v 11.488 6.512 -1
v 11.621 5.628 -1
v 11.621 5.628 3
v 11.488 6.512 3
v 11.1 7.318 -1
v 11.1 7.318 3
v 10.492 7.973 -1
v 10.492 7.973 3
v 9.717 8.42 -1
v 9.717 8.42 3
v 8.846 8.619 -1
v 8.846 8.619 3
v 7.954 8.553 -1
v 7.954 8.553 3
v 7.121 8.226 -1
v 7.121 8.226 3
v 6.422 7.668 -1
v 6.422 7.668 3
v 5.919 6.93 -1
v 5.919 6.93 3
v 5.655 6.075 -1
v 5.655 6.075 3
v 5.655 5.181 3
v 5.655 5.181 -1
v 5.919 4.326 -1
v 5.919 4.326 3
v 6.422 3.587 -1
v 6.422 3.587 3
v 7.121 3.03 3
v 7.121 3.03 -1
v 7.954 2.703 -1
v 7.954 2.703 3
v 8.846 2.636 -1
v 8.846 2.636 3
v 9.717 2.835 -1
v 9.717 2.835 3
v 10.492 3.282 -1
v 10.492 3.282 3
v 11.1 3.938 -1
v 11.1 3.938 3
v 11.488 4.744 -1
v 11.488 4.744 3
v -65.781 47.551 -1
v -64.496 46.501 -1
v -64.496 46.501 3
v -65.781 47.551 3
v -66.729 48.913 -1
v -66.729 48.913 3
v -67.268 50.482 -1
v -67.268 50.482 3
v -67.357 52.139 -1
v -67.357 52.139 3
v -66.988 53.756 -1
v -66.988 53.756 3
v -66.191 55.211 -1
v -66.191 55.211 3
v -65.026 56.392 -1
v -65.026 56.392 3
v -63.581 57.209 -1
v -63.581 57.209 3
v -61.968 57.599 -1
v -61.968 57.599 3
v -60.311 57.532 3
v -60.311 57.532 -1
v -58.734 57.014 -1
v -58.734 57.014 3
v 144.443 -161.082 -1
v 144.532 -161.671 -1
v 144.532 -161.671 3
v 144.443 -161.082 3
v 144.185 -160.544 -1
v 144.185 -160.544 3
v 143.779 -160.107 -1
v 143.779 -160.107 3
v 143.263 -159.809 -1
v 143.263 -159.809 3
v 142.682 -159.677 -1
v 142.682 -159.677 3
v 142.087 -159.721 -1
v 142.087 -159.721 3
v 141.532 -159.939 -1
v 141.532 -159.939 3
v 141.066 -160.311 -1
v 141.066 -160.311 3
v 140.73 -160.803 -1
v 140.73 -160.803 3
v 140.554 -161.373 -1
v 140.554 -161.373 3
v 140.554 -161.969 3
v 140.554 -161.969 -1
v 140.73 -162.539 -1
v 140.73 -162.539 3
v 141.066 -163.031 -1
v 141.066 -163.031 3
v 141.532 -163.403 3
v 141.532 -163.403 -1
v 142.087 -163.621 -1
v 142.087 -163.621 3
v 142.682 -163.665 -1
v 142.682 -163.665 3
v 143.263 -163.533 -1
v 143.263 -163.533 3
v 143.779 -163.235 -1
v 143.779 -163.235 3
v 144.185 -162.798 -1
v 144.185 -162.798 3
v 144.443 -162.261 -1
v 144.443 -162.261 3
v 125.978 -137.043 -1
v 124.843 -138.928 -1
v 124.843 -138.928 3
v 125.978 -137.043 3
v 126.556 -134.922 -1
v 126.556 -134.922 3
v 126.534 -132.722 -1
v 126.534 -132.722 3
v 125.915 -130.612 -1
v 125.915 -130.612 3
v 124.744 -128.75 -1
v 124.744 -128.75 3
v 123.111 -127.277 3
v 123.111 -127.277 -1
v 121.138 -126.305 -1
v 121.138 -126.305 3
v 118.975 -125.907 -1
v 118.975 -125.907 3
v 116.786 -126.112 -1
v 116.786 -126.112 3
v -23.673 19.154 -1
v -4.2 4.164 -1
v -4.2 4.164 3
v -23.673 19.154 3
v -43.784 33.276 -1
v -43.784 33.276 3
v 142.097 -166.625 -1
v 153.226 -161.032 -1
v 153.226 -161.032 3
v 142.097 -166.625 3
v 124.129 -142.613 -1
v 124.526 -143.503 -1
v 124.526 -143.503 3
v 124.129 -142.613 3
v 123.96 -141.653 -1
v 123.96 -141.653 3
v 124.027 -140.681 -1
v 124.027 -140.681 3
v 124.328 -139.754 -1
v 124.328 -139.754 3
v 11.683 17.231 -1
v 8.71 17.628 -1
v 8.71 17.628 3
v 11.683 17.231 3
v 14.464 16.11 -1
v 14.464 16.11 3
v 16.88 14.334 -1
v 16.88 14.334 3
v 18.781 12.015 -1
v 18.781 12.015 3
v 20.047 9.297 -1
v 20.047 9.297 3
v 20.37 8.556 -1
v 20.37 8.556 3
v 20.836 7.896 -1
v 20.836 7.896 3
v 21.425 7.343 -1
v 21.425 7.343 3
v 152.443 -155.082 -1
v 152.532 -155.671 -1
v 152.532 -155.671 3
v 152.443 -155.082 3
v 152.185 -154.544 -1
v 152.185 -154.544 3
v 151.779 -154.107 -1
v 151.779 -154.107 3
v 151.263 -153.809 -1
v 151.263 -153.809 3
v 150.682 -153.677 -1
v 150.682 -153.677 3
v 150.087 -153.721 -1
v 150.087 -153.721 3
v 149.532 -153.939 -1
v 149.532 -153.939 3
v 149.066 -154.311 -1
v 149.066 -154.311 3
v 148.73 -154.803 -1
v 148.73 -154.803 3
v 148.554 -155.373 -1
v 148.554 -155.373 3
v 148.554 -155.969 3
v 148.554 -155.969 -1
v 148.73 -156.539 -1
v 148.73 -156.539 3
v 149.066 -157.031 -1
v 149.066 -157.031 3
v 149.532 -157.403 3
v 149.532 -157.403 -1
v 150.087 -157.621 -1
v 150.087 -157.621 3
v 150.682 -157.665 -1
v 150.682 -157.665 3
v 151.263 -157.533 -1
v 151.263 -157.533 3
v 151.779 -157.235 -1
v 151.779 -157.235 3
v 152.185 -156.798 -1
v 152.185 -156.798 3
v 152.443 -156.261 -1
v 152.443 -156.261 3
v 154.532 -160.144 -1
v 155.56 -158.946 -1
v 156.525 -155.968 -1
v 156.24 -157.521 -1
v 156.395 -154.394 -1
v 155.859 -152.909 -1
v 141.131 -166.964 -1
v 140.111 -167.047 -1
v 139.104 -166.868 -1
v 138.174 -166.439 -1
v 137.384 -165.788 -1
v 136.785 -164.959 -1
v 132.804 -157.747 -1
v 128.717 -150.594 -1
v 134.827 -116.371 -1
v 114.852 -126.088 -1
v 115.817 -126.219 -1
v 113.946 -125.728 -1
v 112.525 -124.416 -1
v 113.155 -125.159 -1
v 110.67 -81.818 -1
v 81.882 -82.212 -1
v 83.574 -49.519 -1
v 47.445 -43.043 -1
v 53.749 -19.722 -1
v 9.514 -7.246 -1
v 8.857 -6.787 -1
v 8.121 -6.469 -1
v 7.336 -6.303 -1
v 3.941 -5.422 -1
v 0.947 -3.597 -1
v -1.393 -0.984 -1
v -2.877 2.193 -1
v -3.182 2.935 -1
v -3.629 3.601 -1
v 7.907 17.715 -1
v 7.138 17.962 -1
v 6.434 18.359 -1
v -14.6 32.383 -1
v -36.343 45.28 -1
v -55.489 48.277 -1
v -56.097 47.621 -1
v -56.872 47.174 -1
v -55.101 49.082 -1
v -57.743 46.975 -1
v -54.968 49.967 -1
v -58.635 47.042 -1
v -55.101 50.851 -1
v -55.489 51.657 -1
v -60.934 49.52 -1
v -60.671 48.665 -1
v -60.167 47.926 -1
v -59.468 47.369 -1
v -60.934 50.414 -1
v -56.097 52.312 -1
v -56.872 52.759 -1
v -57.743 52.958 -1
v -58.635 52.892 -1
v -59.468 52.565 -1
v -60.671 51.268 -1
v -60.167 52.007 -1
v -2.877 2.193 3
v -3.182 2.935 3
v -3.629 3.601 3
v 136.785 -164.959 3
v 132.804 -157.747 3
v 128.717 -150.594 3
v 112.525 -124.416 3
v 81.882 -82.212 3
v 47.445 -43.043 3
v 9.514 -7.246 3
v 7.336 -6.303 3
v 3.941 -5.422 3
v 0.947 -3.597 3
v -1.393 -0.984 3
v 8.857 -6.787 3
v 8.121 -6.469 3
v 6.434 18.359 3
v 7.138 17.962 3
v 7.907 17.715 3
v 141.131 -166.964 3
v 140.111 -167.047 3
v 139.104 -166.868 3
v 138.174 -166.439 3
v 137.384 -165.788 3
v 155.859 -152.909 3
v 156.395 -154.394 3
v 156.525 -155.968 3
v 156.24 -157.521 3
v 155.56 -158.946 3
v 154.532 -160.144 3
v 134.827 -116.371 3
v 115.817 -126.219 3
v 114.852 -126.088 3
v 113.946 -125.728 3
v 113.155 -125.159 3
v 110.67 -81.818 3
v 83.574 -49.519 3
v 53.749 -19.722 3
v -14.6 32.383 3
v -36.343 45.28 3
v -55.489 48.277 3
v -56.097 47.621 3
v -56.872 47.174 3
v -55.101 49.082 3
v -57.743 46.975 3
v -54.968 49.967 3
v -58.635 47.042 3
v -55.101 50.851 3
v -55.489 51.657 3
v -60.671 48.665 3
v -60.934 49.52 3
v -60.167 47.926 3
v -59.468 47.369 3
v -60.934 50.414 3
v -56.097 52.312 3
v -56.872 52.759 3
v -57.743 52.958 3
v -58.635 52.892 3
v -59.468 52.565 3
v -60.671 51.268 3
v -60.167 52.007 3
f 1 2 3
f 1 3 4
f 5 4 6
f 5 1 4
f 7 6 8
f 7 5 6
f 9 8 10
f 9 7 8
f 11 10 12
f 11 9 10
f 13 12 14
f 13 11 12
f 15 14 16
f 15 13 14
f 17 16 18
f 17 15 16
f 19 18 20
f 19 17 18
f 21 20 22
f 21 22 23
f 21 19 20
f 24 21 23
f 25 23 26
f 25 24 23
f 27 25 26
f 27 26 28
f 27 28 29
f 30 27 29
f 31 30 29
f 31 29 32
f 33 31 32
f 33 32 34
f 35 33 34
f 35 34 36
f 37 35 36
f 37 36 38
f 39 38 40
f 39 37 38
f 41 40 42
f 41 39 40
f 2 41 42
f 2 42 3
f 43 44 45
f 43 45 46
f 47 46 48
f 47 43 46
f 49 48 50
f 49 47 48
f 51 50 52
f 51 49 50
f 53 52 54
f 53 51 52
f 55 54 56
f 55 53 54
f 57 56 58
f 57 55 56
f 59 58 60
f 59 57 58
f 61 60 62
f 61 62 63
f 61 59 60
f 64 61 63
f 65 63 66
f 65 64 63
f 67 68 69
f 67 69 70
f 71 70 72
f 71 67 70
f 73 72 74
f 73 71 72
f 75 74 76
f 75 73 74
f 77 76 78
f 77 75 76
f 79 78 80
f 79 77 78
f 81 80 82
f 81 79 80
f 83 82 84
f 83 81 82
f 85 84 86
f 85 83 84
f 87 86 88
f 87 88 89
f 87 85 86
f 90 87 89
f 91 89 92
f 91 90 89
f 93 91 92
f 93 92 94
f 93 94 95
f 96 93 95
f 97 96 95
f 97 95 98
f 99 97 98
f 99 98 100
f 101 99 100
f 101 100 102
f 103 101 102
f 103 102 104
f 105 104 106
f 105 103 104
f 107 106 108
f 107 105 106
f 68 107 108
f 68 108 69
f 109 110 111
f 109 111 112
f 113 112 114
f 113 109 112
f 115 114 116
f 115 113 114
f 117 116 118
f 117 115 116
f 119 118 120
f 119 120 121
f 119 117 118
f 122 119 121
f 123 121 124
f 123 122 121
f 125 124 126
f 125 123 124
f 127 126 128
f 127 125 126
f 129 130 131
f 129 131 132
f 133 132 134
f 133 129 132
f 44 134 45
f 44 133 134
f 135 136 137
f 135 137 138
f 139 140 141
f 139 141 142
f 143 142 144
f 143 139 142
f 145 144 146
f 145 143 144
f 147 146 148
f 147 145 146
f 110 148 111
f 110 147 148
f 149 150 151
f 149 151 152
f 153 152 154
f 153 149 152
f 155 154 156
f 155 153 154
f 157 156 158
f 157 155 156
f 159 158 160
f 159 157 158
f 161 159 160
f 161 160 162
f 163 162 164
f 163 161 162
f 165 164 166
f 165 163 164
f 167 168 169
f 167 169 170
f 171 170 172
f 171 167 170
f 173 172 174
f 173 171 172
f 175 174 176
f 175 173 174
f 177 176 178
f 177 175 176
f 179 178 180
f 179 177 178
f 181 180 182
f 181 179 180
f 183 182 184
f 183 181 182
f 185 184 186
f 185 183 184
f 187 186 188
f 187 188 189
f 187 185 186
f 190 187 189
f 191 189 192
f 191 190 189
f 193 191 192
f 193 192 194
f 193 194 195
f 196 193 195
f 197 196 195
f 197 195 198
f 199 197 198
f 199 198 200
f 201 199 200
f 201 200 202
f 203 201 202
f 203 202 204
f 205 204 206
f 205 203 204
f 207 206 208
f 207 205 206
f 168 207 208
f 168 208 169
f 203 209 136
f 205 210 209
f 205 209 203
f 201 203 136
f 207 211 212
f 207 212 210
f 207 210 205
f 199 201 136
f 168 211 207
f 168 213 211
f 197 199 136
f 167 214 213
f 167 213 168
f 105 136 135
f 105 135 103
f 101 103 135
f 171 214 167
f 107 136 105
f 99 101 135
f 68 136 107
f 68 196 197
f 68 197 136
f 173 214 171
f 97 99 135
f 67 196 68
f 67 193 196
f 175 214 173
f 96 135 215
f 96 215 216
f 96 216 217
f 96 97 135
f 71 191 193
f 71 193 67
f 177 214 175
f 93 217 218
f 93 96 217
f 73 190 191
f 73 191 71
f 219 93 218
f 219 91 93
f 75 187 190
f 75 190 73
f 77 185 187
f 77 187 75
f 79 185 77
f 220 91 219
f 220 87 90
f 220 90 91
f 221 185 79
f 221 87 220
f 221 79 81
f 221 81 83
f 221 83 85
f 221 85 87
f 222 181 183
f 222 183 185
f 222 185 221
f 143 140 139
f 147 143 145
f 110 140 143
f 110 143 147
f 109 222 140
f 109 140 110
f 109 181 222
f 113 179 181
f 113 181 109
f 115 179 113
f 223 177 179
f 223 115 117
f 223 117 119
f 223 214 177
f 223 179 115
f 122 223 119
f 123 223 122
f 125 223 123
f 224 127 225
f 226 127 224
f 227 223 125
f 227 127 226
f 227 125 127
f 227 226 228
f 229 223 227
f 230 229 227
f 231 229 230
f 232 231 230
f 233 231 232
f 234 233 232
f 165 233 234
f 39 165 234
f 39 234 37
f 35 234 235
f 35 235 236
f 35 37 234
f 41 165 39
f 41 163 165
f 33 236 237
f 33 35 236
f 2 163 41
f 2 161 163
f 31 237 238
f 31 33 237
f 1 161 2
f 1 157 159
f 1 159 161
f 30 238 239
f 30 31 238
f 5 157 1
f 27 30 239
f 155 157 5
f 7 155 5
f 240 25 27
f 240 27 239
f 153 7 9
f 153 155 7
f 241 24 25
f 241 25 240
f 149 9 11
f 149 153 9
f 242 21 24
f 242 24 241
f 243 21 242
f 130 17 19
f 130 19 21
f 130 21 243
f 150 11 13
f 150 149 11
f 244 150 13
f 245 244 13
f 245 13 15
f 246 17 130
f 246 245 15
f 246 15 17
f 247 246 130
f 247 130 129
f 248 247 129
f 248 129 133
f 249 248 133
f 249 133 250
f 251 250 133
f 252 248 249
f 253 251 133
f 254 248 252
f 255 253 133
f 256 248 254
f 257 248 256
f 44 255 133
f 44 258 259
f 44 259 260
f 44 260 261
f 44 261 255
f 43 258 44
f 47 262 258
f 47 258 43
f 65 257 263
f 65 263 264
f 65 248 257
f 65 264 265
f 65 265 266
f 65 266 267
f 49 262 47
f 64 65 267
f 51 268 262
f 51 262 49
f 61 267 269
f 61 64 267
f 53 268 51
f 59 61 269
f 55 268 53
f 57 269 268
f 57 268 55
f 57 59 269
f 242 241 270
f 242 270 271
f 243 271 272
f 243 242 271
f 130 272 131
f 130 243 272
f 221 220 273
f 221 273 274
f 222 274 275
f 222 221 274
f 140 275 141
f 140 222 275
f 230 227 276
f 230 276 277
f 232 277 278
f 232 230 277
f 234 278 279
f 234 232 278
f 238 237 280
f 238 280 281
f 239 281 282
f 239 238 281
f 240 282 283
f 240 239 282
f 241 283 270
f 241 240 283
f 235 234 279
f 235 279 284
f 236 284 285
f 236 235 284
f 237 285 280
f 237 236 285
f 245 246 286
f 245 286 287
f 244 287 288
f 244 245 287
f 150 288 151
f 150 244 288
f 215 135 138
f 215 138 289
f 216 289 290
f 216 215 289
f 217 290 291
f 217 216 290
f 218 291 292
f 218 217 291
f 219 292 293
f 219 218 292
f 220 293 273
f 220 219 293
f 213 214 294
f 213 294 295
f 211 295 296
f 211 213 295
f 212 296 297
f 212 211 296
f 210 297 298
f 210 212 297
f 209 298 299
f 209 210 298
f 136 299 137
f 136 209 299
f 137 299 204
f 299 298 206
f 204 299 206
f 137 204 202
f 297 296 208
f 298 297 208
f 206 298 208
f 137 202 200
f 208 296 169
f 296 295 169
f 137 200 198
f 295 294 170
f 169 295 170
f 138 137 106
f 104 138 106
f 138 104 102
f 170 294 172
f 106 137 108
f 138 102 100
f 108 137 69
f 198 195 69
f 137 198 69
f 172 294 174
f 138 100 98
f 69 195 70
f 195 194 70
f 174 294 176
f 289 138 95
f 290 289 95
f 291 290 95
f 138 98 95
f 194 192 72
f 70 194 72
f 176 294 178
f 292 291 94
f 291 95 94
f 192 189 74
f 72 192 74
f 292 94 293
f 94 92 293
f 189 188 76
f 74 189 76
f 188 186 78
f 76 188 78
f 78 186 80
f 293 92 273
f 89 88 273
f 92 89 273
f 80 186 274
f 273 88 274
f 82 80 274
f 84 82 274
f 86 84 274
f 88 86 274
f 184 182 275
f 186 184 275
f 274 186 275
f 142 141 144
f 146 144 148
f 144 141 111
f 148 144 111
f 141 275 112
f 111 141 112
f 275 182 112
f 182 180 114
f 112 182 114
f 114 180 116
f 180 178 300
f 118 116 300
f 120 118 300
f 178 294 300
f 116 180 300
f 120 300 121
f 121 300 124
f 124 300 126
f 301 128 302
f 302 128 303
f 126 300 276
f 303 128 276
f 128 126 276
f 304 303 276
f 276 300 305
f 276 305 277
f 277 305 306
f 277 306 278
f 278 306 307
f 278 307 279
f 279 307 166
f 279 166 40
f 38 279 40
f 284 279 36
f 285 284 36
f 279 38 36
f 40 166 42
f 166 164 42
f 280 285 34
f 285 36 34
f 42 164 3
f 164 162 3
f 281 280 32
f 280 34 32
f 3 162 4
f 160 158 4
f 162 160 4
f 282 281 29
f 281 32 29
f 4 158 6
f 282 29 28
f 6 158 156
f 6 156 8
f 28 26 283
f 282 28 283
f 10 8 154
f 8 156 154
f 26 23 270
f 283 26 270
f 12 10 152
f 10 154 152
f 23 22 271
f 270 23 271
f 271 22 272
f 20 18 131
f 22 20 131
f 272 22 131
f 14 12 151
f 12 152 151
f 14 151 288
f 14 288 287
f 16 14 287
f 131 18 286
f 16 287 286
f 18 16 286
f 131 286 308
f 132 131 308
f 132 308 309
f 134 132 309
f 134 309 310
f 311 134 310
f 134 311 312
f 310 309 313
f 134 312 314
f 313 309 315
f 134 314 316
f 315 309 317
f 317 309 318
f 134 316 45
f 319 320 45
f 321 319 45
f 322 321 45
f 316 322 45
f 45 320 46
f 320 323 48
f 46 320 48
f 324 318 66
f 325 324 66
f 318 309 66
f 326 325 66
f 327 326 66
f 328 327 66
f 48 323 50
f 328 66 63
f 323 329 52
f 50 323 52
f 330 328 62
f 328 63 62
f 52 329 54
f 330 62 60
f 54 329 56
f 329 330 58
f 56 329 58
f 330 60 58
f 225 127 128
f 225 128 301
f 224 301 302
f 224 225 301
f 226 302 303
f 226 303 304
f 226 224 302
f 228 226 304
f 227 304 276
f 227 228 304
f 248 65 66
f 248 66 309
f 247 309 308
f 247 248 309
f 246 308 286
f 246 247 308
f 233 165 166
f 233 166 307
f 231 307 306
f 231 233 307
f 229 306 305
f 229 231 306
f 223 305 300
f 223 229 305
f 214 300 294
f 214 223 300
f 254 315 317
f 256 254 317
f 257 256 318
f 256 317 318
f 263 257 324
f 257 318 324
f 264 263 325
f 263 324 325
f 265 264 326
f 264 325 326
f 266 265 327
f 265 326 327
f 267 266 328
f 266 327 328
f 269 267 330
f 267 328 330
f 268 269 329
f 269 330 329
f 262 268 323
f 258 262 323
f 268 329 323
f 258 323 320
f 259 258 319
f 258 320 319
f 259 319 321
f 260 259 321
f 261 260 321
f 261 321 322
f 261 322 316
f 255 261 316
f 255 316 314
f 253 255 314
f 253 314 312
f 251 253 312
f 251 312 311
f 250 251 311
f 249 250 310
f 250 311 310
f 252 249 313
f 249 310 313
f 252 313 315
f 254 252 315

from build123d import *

# Parameters (mm, degrees)
SKETCH_1_R          = 1.5
SKETCH_1_R_2        = 1
EXTRUDE_1_DEPTH     = 2
SCALE_1_SCALE       = 2
SKETCH_3_R          = 1.627142949
SKETCH_3_R_2        = 4.234260579
SKETCH_3_R_3        = 3
EXTRUDE_3_DEPTH     = 4
SKETCH_2_R          = 3
CUT_EXTRUDE_1_DEPTH = 4


with BuildPart() as part:
    # 草图1 → 凸台-拉伸1 (new body)
    with BuildSketch(Plane.XY):
        with BuildLine():
            Line((107.302513423, -106.329977447), (101.737876551, -109.126595767))
            ThreePointArc((101.737876551, -109.126595767), (100.241041238, -109.247857431), (99.081776454, -108.293223729))
            ThreePointArc((99.081776454, -108.293223729), (96.076157143, -102.895430459), (92.952174798, -97.565265927))
            ThreePointArc((92.952174798, -97.565265927), (92.67119221, -96.396525563), (93.110928625, -95.277804356))
            ThreePointArc((93.110928625, -95.277804356), (93.386262354, -90.634283432), (89.082079375, -88.870167754))
            ThreePointArc((89.082079375, -88.870167754), (87.883298953, -88.781676215), (86.951761021, -88.02197737))
            ThreePointArc((86.951761021, -88.02197737), (63.249240179, -56.927091802), (35.446375502, -29.437055089))
            ThreePointArc((35.446375502, -29.437055089), (34.93756912, -29.118601809), (34.357184804, -28.965466337))
            ThreePointArc((34.357184804, -28.965466337), (31.162596189, -27.612410648), (29.250996223, -24.717252331))
            ThreePointArc((29.250996223, -24.717252331), (28.99483955, -24.174407799), (28.589143834, -23.732019493))
            ThreePointArc((28.589143834, -23.732019493), (13.863721442, -12.651321704), (-1.558710581, -2.56328331))
            ThreePointArc((-1.558710581, -2.56328331), (-2.630799159, 1.441837641), (1.322046154, 2.692989782))
            ThreePointArc((1.322046154, 2.692989782), (17.996215952, -6.326789823), (33.906457747, -16.634484455))
            ThreePointArc((33.906457747, -16.634484455), (34.447529327, -16.904338105), (35.04451896, -17.000165164))
            ThreePointArc((35.04451896, -17.000165164), (38.553058948, -18.165150249), (40.712715331, -21.16563811))
            ThreePointArc((40.712715331, -21.16563811), (40.982462328, -21.706762868), (41.401593445, -22.142547854))
            ThreePointArc((41.401593445, -22.142547854), (79.427798672, -58.499548545), (108.618618094, -102.268485529))
            ThreePointArc((108.618618094, -102.268485529), (108.809267395, -104.574248701), (107.302513423, -106.329977447))
        make_face()
        Circle(SKETCH_1_R, mode=Mode.SUBTRACT)
        with Locations((105.955364791, -103.64945687)):
            Circle(SKETCH_1_R_2, mode=Mode.SUBTRACT)
        with Locations((101.955364791, -106.64945687)):
            Circle(SKETCH_1_R_2, mode=Mode.SUBTRACT)
        with Locations((35, -23)):
            Circle(SKETCH_1_R, mode=Mode.SUBTRACT)
    extrude(amount=EXTRUDE_1_DEPTH)


with BuildPart() as part_1:
    # 缩放比例1: scaled about (61.378569751, -51.627856738, 1)
    add(part.part.scale(SCALE_1_SCALE).moved(Location((-61.378569751, 51.627856738, -1))))

    # 草图3 → 凸台-拉伸3 (add)
    # profile 1 of 8: a face of its own
    with BuildSketch(Plane(origin=(0, 0, -1), x_dir=(-1, 0, 0), z_dir=(0, 0, -1))):
        with Locations((58.543077077, 54.655425944)):
            Circle(SKETCH_3_R)
    # profile 2 of 8: a face of its own
    with BuildSketch(Plane(origin=(0, 0, -1), x_dir=(-1, 0, 0), z_dir=(0, 0, -1))):
        with Locations((61.20941419, 50.866420573)):
            Circle(SKETCH_3_R_2)
        with Locations((61.378569751, 51.627856738)):
            Circle(SKETCH_3_R_3, mode=Mode.SUBTRACT)
    # profile 3 of 8: a face of its own
    with BuildSketch(Plane(origin=(0, 0, -1), x_dir=(-1, 0, 0), z_dir=(0, 0, -1))):
        with Locations((58.543077077, 54.655425944)):
            Circle(SKETCH_3_R)
    # profile 4 of 8: a face of its own
    with BuildSketch(Plane(origin=(0, 0, -1), x_dir=(-1, 0, 0), z_dir=(0, 0, -1))):
        with Locations((58.543077077, 54.655425944)):
            Circle(SKETCH_3_R)
    # profile 5 of 8: a face of its own
    with BuildSketch(Plane(origin=(0, 0, -1), x_dir=(-1, 0, 0), z_dir=(0, 0, -1))):
        with Locations((61.20941419, 50.866420573)):
            Circle(SKETCH_3_R_2)
        with Locations((61.378569751, 51.627856738)):
            Circle(SKETCH_3_R_3, mode=Mode.SUBTRACT)
    # profile 6 of 8: a face of its own
    with BuildSketch(Plane(origin=(0, 0, -1), x_dir=(-1, 0, 0), z_dir=(0, 0, -1))):
        with Locations((61.378569751, 51.627856738)):
            Circle(SKETCH_3_R_3)
    # profile 7 of 8: a face of its own
    with BuildSketch(Plane(origin=(0, 0, -1), x_dir=(-1, 0, 0), z_dir=(0, 0, -1))):
        with Locations((58.543077077, 54.655425944)):
            Circle(SKETCH_3_R)
    # profile 8 of 8: a face of its own
    with BuildSketch(Plane(origin=(0, 0, -1), x_dir=(-1, 0, 0), z_dir=(0, 0, -1))):
        with Locations((61.378569751, 51.627856738)):
            Circle(SKETCH_3_R_3)
    extrude(amount=-EXTRUDE_3_DEPTH)

    # 草图2 → 切除-拉伸1 (cut)
    with BuildSketch(Plane.XY.offset(3)):
        with Locations((-57.967630724, 49.966726496)):
            Circle(SKETCH_2_R)
    extrude(amount=-CUT_EXTRUDE_1_DEPTH, mode=Mode.SUBTRACT)


solid = part_1.part
